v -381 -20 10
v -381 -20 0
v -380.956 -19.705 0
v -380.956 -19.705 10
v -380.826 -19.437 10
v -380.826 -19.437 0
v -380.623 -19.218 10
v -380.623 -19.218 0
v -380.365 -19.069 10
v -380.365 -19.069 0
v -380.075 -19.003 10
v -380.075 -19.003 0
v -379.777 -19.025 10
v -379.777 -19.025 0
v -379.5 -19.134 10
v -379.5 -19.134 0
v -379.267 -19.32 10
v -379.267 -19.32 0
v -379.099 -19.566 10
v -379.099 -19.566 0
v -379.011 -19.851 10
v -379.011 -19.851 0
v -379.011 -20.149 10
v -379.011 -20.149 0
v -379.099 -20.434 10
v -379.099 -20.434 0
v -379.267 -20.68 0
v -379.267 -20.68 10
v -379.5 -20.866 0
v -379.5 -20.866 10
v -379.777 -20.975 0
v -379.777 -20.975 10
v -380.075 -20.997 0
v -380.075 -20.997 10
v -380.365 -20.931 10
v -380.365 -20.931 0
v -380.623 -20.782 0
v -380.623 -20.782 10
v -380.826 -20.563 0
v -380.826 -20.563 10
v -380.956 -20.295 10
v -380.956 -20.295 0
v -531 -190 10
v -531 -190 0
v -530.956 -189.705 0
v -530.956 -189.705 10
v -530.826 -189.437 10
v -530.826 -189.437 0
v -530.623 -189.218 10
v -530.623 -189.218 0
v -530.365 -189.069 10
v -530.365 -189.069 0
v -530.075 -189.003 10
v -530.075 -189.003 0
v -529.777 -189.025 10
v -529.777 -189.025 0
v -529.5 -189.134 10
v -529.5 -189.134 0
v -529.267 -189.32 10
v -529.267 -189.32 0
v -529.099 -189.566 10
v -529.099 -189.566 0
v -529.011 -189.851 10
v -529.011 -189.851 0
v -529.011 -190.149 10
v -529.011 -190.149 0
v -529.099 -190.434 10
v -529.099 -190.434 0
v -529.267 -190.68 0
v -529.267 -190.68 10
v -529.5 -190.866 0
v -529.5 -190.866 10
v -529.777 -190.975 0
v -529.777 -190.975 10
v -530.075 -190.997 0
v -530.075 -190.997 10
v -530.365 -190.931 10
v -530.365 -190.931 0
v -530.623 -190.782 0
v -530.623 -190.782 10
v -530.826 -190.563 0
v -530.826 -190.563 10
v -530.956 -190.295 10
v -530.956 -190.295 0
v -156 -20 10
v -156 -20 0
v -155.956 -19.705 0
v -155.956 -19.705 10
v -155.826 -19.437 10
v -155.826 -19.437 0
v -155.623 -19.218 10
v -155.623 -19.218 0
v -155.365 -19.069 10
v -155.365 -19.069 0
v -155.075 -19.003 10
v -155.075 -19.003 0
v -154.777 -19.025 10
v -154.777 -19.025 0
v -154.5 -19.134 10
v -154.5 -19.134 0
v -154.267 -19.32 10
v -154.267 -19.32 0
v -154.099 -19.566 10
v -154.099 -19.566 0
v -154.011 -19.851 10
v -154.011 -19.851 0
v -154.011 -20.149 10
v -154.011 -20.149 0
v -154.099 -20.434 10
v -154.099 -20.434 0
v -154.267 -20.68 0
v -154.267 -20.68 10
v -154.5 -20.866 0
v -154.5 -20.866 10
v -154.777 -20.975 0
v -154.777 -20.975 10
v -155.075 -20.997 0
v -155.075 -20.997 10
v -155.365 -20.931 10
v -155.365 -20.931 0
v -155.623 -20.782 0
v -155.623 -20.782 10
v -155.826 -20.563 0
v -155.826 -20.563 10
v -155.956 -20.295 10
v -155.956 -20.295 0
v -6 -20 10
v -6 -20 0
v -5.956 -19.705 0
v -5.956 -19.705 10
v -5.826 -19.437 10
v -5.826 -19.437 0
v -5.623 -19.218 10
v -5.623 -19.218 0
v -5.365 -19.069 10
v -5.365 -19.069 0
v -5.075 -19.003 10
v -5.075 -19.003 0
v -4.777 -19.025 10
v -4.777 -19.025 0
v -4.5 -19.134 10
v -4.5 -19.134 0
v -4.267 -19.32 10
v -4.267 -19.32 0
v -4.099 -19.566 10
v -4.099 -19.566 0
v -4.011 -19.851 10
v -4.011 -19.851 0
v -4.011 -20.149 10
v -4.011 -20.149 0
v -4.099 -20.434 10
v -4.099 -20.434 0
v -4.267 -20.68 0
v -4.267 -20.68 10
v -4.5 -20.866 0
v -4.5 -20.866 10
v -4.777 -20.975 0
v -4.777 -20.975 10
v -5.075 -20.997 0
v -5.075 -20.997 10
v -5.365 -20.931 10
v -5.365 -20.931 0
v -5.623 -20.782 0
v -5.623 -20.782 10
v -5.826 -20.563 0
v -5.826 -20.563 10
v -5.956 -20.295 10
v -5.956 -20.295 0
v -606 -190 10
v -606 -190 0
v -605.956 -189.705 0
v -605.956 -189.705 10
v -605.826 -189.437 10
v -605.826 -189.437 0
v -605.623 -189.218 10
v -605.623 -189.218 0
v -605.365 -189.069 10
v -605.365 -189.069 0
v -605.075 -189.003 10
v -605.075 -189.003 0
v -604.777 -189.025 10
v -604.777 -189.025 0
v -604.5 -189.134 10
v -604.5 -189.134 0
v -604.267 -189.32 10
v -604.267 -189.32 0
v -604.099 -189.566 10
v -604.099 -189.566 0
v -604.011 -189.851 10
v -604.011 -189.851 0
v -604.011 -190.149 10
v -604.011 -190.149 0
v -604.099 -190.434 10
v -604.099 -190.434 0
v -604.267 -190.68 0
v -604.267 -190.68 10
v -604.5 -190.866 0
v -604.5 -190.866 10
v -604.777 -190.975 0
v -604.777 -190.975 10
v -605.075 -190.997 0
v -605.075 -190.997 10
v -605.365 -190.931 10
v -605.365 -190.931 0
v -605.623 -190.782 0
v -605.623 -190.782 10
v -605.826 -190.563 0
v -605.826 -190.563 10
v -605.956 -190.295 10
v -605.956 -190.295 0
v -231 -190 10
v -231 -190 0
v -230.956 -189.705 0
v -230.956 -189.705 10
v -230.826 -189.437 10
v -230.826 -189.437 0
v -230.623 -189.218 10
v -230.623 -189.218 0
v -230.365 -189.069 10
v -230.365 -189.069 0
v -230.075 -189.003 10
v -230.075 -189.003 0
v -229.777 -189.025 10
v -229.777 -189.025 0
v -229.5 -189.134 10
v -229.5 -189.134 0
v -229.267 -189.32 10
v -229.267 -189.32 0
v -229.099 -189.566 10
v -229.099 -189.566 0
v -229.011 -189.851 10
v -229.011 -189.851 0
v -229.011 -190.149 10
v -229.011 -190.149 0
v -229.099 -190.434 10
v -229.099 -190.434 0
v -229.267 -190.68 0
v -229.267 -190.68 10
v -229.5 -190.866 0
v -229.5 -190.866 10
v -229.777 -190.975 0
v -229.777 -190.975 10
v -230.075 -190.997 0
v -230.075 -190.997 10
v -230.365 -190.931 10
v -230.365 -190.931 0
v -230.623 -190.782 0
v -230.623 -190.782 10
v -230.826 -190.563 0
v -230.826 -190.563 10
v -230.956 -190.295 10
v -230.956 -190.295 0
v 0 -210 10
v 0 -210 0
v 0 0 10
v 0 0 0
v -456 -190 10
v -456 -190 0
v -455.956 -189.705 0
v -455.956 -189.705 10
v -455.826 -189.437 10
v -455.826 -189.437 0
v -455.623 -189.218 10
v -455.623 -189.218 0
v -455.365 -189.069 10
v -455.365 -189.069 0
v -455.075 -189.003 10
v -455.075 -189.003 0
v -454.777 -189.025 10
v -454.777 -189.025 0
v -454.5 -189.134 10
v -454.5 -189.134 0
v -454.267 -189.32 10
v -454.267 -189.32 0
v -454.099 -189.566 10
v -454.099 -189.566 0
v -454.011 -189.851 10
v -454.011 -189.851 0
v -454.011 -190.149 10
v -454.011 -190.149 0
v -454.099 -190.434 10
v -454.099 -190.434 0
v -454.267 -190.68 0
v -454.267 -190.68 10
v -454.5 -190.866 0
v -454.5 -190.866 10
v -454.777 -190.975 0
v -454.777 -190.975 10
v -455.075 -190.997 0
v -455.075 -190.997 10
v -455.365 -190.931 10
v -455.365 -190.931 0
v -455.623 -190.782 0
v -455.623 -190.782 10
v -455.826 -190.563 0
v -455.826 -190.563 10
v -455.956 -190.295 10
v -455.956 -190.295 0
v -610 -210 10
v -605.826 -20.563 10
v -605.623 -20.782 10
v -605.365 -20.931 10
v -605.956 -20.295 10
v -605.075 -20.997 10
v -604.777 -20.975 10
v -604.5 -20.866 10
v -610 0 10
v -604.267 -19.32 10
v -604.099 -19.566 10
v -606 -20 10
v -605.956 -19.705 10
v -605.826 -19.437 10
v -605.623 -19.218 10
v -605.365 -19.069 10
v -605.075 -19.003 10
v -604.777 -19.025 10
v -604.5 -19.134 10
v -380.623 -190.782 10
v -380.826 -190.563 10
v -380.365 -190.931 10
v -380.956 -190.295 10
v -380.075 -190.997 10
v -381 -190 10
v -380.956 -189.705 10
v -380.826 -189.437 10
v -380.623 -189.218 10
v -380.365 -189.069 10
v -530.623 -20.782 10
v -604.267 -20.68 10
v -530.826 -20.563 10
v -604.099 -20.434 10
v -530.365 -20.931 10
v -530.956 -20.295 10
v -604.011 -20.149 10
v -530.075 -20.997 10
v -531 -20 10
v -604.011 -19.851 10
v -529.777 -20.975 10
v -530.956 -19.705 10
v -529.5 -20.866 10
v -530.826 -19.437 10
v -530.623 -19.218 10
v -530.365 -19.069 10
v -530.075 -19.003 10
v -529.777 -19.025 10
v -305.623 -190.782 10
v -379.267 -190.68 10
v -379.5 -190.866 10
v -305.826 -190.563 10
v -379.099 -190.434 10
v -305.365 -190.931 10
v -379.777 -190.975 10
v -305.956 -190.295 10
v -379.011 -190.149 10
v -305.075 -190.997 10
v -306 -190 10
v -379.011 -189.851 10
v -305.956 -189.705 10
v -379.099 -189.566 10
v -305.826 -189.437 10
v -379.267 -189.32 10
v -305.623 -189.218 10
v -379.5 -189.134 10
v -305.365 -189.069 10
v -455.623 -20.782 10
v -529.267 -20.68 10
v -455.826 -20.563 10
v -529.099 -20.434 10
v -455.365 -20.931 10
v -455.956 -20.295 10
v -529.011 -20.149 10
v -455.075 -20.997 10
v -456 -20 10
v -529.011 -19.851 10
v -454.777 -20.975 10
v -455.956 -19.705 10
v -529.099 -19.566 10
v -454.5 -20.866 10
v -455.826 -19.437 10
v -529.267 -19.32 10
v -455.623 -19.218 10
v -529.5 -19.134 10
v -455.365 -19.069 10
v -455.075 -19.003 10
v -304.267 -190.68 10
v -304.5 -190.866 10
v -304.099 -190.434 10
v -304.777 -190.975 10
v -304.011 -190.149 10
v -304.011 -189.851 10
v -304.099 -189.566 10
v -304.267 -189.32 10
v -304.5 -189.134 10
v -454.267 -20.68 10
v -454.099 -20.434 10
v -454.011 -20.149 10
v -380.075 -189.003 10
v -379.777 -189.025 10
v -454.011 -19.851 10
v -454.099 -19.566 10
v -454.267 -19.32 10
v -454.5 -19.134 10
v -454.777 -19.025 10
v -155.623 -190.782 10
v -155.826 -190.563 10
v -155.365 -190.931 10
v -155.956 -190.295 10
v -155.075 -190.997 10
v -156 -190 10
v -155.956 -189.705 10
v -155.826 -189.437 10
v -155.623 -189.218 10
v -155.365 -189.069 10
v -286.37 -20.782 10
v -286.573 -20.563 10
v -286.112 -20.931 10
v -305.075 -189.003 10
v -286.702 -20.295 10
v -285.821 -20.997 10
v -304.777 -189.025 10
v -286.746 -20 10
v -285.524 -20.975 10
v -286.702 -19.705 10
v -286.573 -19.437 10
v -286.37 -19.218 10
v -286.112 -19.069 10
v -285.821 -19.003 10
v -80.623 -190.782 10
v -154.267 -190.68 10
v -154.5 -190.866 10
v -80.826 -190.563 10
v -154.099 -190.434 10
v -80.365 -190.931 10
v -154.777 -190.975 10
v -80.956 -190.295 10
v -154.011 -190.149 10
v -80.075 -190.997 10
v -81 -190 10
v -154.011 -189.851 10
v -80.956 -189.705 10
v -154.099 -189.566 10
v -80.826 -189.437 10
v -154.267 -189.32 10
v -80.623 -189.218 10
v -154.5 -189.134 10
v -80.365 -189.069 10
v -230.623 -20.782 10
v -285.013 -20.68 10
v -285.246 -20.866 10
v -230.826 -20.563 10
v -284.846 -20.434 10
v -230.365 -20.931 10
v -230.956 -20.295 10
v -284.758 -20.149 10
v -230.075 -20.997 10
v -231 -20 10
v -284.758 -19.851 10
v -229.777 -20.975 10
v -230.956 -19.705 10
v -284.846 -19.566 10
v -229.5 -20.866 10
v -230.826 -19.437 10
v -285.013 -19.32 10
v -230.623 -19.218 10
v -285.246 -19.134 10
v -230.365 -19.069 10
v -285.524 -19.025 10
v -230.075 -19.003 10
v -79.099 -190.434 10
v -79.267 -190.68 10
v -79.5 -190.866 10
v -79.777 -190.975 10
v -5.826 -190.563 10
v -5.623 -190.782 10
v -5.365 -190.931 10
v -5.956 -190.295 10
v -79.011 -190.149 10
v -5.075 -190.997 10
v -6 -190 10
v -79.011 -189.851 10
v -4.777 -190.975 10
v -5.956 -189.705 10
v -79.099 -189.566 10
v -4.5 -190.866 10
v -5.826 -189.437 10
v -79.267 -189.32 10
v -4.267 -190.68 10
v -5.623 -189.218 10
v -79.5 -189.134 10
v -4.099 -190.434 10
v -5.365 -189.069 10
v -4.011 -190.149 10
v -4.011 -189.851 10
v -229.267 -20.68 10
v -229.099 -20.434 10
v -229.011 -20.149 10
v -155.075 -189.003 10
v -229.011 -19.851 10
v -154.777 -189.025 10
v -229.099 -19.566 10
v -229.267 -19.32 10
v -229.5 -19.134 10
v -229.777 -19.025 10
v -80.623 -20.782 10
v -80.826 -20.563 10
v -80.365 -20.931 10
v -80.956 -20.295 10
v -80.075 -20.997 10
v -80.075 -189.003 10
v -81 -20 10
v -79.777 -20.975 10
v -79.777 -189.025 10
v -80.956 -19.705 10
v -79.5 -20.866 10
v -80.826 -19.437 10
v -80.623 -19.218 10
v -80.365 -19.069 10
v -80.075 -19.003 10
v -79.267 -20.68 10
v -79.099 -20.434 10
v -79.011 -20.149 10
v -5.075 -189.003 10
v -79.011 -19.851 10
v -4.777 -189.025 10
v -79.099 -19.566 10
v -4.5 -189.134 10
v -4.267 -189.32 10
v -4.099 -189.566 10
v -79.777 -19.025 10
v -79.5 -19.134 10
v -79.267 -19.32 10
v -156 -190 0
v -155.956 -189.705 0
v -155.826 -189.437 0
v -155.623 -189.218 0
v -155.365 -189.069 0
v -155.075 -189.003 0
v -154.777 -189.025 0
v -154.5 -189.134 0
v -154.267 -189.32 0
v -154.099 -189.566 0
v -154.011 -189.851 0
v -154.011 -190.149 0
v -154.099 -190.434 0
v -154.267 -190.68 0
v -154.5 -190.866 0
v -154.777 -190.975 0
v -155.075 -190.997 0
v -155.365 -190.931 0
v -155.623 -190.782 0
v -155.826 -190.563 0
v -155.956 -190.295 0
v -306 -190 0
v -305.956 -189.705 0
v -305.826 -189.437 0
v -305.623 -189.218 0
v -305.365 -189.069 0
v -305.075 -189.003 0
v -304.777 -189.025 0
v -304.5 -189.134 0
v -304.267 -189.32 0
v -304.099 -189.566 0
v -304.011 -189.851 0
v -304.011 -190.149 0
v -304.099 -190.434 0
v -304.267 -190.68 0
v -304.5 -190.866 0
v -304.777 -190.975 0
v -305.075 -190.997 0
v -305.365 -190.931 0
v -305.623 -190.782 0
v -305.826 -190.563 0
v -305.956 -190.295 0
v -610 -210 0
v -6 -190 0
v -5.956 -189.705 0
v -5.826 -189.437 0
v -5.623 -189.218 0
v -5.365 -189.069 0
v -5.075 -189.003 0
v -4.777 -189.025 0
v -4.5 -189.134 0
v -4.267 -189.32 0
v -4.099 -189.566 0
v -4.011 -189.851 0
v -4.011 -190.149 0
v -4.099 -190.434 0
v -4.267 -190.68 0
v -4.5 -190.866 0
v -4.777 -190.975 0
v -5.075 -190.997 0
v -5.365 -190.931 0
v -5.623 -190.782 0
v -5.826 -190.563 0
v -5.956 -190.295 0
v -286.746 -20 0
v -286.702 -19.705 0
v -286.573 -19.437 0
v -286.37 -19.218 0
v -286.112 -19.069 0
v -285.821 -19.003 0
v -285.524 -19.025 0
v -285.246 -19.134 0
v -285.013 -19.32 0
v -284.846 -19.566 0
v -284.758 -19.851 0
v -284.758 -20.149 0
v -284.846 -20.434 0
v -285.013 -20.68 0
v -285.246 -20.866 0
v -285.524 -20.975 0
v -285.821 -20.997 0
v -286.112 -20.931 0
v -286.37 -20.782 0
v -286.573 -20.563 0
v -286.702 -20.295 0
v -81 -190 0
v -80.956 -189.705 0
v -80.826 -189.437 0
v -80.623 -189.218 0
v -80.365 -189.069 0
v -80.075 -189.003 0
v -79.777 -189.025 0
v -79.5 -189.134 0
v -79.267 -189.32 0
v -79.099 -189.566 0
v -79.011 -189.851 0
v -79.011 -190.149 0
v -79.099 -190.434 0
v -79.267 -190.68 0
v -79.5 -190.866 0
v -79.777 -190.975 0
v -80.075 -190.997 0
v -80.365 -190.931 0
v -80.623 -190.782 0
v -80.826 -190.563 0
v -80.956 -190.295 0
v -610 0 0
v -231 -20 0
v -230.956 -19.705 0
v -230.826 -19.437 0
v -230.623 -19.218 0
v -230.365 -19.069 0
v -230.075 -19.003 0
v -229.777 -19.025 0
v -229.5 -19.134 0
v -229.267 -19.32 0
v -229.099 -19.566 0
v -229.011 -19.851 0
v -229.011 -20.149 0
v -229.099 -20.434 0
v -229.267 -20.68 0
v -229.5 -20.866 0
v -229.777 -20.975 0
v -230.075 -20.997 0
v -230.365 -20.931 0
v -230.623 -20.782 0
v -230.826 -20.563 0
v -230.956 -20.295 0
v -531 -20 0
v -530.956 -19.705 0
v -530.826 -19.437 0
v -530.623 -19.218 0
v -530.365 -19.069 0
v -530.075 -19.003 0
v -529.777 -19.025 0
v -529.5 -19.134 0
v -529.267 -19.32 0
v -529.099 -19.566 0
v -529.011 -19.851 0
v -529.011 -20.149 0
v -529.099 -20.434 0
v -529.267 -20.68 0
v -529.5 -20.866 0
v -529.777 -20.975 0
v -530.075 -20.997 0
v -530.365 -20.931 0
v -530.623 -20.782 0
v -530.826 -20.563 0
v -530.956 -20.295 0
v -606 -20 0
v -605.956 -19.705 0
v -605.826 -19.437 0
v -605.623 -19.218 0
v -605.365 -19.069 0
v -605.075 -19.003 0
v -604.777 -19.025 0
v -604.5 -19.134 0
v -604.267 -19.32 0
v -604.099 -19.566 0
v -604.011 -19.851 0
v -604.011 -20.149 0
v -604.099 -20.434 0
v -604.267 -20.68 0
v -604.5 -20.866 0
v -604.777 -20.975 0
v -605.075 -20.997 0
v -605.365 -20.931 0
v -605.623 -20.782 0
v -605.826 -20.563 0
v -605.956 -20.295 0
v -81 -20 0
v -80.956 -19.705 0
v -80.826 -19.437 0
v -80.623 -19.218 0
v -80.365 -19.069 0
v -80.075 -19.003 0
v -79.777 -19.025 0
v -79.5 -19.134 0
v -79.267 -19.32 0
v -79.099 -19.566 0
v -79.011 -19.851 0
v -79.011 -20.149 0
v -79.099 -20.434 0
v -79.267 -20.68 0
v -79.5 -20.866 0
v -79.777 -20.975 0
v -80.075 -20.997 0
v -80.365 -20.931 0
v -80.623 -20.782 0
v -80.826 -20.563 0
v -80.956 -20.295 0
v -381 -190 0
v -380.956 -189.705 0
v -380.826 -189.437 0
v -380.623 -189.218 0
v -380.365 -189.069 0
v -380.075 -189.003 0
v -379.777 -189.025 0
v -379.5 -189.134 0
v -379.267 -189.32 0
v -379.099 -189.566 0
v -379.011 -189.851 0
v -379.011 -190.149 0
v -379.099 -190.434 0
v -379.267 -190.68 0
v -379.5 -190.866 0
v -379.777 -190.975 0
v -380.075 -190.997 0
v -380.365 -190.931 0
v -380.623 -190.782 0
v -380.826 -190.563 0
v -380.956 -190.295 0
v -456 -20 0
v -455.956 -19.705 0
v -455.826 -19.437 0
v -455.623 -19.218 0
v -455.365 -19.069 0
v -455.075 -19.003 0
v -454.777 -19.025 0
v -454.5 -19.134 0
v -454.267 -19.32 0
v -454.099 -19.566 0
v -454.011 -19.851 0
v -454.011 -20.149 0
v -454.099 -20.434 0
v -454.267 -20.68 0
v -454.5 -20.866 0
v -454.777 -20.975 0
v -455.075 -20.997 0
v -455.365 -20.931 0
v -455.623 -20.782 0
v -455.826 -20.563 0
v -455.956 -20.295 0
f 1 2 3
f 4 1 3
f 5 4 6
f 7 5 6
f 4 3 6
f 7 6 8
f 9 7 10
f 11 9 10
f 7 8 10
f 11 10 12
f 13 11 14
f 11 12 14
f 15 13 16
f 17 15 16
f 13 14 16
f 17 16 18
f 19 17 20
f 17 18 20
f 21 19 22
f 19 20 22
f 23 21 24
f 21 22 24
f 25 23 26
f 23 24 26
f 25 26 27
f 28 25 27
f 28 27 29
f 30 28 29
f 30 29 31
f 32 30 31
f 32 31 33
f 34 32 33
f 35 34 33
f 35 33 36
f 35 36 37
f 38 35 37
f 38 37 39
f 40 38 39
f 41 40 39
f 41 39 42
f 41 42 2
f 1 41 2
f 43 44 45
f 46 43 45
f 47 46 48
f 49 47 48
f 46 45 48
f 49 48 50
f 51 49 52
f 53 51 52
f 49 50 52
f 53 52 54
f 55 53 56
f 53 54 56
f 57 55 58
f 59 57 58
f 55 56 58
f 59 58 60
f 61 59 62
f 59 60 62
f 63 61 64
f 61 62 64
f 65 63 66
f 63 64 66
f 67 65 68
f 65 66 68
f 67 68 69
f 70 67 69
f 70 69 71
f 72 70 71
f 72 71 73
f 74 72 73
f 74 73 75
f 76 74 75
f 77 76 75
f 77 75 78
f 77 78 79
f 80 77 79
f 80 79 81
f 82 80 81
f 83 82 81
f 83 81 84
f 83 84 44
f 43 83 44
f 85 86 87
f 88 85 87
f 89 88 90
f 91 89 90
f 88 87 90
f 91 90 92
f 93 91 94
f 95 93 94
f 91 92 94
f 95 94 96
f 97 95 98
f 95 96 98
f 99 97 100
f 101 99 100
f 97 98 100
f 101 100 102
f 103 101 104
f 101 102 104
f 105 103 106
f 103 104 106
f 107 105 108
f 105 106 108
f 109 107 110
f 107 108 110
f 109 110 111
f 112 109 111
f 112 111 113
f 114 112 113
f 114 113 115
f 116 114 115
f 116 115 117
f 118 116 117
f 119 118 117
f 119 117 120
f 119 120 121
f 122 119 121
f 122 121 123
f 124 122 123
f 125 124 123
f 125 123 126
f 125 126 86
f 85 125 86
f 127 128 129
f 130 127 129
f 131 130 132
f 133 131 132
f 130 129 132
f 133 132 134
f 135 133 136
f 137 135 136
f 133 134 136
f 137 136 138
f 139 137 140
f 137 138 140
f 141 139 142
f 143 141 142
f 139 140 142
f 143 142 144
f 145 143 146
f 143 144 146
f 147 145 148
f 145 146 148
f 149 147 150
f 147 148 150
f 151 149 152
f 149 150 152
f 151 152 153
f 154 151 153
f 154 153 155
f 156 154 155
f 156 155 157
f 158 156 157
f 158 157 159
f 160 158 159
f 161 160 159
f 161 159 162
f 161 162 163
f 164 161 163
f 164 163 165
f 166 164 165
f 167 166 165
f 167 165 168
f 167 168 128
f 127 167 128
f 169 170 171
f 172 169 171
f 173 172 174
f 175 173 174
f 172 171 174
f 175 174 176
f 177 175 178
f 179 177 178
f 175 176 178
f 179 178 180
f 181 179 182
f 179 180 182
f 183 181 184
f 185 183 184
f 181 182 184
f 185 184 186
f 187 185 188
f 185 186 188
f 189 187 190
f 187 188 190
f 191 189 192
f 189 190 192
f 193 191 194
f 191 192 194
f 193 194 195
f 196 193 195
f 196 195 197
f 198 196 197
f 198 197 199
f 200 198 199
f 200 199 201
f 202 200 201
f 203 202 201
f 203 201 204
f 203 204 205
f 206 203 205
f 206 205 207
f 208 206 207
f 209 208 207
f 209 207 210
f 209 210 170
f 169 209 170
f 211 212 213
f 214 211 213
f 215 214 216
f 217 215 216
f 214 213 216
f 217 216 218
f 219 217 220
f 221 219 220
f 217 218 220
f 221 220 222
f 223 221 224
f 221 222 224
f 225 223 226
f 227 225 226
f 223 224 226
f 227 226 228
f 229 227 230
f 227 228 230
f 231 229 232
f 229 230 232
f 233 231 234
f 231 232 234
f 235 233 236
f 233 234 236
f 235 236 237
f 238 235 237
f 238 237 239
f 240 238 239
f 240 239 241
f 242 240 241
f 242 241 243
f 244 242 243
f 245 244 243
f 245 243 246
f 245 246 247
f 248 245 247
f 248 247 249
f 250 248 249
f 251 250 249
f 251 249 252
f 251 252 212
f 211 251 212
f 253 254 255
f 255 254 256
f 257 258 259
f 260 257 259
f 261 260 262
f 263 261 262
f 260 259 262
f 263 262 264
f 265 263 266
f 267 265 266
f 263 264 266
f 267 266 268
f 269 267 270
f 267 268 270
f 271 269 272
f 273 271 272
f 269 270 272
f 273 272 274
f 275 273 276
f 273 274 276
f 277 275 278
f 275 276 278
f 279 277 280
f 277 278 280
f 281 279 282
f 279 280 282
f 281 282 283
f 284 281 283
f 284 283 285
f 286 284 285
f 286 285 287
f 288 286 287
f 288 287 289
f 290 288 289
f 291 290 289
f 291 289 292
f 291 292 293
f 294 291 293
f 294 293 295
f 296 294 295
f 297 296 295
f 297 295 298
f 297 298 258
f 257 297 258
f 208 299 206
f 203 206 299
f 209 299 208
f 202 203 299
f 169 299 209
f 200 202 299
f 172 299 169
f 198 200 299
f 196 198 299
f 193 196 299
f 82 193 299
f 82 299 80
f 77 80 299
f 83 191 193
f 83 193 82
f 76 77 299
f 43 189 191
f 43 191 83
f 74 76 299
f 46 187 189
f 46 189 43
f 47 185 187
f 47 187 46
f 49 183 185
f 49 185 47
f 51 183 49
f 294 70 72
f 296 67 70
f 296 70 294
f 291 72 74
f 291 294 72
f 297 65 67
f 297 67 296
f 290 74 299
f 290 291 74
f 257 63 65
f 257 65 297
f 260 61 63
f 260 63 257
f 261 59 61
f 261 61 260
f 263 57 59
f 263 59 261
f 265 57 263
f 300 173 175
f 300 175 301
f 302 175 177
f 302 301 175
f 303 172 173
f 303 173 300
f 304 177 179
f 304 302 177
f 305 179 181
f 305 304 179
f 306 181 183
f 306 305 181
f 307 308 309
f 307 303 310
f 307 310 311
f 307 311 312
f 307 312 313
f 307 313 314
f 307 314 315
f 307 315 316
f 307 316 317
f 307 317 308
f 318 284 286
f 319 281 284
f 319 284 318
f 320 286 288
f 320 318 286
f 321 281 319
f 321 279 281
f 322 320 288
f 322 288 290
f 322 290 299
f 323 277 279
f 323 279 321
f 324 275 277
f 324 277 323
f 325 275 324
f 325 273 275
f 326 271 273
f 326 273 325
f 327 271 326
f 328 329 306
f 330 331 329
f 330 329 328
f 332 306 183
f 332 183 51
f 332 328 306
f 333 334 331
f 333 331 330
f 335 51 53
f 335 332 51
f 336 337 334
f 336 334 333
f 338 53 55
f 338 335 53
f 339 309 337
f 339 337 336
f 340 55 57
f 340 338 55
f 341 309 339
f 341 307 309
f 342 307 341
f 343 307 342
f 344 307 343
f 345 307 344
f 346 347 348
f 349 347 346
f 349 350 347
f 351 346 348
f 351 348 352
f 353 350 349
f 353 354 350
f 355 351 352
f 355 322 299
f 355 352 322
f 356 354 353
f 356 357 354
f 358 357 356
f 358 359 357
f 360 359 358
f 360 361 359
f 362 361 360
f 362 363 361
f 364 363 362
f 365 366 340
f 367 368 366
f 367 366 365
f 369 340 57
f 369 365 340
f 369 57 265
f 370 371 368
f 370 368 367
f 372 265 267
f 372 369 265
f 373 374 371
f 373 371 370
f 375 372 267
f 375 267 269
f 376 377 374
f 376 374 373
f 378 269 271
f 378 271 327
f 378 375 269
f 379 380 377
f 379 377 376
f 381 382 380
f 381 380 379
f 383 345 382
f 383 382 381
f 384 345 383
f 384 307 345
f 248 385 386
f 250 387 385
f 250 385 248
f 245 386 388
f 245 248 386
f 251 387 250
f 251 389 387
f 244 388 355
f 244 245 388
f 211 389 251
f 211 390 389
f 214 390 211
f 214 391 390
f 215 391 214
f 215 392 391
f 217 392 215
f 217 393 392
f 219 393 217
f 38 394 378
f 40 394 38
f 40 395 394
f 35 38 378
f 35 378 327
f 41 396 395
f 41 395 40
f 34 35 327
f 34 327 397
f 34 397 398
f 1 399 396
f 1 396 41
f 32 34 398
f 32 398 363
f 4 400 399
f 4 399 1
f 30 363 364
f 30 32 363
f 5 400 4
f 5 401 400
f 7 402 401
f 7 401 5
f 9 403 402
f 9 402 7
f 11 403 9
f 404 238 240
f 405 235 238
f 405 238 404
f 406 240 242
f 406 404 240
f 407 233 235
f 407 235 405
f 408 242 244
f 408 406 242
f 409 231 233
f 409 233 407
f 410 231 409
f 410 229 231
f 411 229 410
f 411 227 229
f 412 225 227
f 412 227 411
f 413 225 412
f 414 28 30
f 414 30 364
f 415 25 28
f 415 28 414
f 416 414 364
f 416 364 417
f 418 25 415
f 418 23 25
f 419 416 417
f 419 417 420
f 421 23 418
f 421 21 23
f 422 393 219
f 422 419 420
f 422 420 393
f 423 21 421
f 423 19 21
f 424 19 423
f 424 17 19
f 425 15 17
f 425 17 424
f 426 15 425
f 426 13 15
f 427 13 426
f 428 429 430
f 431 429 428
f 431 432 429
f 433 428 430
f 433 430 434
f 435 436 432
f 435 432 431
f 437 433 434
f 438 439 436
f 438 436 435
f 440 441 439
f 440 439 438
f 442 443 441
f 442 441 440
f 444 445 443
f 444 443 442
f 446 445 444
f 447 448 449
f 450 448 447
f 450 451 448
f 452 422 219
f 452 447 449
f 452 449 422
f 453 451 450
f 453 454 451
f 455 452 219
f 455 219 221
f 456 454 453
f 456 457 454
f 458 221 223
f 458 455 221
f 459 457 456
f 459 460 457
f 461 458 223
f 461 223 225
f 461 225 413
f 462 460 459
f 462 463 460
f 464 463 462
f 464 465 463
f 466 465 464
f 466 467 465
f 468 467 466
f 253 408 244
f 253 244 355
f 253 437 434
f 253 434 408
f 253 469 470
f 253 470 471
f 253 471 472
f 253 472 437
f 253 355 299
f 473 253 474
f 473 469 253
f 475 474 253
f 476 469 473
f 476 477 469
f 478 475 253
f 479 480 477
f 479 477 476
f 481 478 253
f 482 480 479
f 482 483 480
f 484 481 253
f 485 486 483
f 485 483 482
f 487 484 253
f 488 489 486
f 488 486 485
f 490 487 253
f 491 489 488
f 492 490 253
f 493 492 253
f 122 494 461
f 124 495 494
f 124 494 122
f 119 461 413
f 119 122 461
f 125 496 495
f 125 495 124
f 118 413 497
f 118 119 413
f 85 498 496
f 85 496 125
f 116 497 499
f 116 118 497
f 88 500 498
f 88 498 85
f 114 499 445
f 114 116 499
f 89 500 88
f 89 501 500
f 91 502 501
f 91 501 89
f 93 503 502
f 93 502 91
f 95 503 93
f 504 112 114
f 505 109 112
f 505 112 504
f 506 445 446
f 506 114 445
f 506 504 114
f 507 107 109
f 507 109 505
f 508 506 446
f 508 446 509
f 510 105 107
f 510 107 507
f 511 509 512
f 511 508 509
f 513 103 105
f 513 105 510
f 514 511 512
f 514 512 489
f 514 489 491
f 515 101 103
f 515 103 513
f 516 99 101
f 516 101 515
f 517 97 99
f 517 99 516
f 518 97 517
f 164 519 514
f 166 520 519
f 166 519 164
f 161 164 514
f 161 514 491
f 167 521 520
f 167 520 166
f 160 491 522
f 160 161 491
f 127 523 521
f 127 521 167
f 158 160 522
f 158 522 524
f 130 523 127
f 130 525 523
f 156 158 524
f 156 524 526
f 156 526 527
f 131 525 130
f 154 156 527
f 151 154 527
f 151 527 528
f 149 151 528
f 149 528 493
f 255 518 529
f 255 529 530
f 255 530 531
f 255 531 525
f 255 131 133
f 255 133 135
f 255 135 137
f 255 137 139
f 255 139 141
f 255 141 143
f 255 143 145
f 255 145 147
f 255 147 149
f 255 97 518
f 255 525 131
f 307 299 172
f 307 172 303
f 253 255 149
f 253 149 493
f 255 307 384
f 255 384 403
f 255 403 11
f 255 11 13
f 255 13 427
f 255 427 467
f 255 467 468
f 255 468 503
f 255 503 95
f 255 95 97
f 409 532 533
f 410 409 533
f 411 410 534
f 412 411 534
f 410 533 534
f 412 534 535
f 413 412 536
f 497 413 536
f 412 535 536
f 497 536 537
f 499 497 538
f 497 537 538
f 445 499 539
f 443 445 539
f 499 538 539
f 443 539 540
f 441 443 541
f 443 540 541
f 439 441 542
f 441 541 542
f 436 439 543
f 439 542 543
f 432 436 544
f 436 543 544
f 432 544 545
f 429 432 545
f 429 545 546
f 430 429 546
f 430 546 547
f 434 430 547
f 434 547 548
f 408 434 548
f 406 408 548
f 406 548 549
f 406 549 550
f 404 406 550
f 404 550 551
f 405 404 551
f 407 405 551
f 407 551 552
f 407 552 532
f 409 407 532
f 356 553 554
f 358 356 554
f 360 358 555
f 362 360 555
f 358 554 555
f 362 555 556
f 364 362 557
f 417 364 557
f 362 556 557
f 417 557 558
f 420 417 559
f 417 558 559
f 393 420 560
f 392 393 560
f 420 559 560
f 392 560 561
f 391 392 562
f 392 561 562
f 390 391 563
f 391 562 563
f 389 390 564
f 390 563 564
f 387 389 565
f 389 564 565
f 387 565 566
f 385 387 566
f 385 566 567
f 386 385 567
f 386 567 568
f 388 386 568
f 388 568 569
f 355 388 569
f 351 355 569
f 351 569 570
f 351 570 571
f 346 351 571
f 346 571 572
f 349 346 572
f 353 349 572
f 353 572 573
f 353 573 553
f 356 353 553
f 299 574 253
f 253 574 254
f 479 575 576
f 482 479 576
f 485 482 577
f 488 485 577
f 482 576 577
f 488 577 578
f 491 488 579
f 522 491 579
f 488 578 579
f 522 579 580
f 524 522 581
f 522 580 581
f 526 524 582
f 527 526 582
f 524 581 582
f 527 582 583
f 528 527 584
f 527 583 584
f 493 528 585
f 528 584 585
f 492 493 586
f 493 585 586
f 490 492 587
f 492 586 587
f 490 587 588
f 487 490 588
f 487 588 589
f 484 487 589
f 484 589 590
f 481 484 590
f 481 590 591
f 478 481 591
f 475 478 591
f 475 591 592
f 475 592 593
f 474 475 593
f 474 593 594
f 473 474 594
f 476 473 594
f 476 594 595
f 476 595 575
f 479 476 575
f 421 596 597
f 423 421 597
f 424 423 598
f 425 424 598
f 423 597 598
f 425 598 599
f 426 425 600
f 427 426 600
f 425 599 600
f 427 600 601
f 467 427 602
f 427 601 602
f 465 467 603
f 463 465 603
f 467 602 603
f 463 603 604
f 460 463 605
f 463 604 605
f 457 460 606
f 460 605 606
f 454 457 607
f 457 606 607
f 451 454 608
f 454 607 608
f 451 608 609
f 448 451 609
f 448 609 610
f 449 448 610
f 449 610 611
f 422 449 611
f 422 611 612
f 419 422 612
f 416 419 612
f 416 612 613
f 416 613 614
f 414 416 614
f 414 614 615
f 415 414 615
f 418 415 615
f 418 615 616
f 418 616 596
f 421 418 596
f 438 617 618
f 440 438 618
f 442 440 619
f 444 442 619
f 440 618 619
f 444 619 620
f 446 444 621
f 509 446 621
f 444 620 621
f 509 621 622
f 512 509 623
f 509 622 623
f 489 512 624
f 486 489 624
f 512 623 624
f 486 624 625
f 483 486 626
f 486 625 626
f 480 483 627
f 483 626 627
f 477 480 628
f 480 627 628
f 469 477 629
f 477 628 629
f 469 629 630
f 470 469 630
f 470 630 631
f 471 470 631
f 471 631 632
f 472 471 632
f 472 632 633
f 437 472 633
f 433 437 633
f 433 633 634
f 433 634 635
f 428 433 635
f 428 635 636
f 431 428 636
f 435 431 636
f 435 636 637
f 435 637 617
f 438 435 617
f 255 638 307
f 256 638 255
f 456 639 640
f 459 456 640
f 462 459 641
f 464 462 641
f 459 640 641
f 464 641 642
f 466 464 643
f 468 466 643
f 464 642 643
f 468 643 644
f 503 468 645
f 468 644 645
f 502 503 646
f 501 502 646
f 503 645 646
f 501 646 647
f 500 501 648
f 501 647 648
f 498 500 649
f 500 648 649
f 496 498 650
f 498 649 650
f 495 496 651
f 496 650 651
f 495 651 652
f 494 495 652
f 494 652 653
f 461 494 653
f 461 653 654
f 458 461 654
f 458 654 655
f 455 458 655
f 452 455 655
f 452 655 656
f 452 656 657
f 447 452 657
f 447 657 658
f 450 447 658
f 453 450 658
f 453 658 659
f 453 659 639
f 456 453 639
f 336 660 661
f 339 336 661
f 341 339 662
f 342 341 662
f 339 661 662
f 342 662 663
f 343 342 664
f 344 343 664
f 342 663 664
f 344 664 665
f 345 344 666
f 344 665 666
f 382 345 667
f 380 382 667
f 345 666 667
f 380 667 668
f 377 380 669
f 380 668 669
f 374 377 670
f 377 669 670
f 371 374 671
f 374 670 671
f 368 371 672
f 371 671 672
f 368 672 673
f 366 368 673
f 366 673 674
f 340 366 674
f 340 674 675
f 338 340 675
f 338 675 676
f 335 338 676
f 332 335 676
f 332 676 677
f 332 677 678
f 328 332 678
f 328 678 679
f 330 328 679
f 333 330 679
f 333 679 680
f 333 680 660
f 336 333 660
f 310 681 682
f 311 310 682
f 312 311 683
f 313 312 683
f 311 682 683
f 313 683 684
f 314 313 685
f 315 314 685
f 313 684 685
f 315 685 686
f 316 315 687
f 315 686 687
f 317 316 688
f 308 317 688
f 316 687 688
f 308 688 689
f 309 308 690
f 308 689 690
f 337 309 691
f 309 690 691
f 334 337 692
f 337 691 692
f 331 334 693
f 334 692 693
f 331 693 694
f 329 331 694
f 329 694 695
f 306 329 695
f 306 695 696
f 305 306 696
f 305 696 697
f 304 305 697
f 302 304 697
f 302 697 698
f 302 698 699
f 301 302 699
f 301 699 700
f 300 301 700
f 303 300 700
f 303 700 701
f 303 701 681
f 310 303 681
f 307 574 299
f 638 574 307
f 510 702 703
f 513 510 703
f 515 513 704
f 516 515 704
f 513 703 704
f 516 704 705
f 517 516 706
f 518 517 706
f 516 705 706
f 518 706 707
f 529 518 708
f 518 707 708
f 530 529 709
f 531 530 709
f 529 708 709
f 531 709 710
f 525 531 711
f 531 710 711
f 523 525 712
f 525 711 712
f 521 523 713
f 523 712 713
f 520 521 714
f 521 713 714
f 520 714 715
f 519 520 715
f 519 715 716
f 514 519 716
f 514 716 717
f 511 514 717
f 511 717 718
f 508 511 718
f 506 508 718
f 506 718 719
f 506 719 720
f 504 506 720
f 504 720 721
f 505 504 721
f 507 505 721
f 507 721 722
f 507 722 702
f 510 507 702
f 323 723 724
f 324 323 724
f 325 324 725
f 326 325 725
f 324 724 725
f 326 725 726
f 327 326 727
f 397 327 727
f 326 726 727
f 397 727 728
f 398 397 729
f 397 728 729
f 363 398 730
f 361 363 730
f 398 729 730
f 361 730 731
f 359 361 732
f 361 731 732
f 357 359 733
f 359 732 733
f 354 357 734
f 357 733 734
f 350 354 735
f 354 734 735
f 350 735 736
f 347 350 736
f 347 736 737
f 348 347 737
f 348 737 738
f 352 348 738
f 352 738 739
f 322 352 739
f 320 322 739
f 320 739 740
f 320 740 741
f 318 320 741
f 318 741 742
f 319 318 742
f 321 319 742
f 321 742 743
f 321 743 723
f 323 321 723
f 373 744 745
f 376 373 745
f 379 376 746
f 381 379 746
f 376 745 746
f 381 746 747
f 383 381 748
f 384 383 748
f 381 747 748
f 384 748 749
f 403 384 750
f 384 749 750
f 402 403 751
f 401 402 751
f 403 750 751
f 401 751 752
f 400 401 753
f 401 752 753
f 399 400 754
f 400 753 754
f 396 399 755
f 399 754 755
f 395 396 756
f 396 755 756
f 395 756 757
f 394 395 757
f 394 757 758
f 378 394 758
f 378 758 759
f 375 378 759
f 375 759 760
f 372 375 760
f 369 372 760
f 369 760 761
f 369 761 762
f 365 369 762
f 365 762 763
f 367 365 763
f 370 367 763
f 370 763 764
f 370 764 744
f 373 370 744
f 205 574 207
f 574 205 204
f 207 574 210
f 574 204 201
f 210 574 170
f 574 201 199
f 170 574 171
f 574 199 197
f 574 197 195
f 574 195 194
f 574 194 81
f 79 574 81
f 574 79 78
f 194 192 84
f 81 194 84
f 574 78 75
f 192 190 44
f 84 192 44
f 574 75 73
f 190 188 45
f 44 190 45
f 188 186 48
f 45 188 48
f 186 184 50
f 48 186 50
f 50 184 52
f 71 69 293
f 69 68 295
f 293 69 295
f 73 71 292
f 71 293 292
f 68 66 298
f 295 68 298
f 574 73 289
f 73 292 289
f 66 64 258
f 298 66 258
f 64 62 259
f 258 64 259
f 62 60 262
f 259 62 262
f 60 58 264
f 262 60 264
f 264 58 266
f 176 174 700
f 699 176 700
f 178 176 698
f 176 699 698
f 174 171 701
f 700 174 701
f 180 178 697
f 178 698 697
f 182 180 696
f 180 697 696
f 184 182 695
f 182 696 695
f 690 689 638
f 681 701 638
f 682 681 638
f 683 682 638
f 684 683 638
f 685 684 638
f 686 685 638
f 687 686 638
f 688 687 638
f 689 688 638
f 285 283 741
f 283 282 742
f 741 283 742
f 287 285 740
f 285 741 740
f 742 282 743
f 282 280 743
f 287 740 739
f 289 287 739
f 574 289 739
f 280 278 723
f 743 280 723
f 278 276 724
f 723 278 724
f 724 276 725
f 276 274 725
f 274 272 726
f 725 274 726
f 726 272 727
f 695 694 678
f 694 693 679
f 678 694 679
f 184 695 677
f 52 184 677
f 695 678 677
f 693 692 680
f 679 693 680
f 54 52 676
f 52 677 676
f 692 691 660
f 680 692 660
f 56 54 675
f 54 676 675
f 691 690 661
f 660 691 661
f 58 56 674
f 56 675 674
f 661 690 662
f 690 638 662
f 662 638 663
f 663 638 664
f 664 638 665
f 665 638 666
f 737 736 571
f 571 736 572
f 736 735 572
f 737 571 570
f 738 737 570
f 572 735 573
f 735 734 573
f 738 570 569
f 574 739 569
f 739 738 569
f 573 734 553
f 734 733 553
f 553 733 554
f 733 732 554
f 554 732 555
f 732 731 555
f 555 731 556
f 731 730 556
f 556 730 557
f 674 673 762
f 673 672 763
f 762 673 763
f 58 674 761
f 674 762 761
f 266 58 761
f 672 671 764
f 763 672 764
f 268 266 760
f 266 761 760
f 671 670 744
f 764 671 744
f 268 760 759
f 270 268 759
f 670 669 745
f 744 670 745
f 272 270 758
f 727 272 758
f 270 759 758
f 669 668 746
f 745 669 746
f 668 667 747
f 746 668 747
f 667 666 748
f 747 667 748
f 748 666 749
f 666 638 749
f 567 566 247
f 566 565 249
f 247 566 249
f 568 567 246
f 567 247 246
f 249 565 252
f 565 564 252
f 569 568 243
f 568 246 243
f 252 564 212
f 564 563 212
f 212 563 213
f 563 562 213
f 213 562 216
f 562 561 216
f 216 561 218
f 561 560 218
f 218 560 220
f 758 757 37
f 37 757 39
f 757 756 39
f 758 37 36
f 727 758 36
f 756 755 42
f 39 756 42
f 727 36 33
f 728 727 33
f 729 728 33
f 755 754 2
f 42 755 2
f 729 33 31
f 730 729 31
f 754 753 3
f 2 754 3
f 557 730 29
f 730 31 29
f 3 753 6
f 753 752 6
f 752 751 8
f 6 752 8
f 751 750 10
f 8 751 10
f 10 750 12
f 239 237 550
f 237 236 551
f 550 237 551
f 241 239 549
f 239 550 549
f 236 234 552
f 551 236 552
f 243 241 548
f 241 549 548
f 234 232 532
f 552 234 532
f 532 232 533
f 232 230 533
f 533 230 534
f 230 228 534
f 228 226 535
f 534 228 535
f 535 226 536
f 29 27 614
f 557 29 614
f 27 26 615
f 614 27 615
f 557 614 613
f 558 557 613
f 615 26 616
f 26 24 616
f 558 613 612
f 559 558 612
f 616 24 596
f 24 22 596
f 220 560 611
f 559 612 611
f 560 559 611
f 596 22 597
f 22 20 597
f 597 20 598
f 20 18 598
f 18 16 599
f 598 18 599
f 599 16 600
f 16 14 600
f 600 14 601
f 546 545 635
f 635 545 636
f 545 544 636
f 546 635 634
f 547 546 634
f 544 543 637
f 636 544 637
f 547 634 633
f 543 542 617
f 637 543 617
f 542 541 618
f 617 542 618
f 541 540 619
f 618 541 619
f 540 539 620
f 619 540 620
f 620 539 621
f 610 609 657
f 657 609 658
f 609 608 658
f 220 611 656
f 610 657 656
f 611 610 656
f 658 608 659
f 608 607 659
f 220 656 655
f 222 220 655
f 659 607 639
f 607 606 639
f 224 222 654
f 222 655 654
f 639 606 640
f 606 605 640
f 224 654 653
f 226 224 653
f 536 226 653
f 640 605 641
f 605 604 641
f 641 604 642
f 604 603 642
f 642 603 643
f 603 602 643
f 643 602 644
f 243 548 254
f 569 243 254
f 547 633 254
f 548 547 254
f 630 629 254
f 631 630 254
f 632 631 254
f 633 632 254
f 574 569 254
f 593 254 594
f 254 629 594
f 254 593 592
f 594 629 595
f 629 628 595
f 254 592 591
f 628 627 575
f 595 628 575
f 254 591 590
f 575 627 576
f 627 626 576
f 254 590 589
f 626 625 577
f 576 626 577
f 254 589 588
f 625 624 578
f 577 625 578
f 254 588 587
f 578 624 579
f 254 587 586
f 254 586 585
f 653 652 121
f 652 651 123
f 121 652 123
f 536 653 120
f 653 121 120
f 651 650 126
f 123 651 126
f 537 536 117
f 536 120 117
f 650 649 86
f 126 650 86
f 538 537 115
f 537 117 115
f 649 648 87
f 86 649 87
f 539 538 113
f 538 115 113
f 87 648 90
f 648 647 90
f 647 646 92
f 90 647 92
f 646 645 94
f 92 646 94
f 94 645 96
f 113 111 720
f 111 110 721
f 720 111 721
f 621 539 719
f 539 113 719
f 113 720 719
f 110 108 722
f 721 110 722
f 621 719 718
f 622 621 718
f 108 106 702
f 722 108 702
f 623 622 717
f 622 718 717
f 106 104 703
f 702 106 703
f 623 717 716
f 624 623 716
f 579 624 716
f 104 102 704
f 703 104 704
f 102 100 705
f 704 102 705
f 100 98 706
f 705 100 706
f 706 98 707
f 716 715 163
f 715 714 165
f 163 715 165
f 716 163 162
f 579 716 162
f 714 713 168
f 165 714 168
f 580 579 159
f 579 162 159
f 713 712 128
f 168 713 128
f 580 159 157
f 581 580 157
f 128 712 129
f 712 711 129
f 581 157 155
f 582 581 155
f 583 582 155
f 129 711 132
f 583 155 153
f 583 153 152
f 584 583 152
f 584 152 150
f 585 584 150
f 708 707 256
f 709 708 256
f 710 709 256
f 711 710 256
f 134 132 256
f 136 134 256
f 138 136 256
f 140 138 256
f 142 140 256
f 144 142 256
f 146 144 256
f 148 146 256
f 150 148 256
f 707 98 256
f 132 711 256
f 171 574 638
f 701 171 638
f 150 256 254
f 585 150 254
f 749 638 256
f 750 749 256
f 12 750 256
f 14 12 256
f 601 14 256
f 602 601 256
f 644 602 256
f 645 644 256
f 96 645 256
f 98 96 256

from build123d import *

# Parameters (mm, degrees)
F0_W     = 610
F0_H     = 210
F1_DEPTH = 10
F3_D     = 2


with BuildPart() as f1:
    # F0 (on Top) → F1 (new body)
    with BuildSketch(Plane.XY):
        with Locations((-305, -105)):
            Rectangle(F0_W, F0_H)
    extrude(amount=F1_DEPTH)

    # F3 (through all)
    with Locations(Plane.XY.offset(10)):
        with Locations((-530, -190), (-455, -190), (-380, -190), (-305, -190), (-230, -190), (-155, -190), (-80, -190), (-80, -20), (-155, -20), (-230, -20), (-285.746487, -20), (-380, -20), (-455, -20), (-530, -20), (-605, -20), (-605, -190), (-5, -20), (-5, -190)):
            Hole(F3_D / 2)


solid = f1.part
